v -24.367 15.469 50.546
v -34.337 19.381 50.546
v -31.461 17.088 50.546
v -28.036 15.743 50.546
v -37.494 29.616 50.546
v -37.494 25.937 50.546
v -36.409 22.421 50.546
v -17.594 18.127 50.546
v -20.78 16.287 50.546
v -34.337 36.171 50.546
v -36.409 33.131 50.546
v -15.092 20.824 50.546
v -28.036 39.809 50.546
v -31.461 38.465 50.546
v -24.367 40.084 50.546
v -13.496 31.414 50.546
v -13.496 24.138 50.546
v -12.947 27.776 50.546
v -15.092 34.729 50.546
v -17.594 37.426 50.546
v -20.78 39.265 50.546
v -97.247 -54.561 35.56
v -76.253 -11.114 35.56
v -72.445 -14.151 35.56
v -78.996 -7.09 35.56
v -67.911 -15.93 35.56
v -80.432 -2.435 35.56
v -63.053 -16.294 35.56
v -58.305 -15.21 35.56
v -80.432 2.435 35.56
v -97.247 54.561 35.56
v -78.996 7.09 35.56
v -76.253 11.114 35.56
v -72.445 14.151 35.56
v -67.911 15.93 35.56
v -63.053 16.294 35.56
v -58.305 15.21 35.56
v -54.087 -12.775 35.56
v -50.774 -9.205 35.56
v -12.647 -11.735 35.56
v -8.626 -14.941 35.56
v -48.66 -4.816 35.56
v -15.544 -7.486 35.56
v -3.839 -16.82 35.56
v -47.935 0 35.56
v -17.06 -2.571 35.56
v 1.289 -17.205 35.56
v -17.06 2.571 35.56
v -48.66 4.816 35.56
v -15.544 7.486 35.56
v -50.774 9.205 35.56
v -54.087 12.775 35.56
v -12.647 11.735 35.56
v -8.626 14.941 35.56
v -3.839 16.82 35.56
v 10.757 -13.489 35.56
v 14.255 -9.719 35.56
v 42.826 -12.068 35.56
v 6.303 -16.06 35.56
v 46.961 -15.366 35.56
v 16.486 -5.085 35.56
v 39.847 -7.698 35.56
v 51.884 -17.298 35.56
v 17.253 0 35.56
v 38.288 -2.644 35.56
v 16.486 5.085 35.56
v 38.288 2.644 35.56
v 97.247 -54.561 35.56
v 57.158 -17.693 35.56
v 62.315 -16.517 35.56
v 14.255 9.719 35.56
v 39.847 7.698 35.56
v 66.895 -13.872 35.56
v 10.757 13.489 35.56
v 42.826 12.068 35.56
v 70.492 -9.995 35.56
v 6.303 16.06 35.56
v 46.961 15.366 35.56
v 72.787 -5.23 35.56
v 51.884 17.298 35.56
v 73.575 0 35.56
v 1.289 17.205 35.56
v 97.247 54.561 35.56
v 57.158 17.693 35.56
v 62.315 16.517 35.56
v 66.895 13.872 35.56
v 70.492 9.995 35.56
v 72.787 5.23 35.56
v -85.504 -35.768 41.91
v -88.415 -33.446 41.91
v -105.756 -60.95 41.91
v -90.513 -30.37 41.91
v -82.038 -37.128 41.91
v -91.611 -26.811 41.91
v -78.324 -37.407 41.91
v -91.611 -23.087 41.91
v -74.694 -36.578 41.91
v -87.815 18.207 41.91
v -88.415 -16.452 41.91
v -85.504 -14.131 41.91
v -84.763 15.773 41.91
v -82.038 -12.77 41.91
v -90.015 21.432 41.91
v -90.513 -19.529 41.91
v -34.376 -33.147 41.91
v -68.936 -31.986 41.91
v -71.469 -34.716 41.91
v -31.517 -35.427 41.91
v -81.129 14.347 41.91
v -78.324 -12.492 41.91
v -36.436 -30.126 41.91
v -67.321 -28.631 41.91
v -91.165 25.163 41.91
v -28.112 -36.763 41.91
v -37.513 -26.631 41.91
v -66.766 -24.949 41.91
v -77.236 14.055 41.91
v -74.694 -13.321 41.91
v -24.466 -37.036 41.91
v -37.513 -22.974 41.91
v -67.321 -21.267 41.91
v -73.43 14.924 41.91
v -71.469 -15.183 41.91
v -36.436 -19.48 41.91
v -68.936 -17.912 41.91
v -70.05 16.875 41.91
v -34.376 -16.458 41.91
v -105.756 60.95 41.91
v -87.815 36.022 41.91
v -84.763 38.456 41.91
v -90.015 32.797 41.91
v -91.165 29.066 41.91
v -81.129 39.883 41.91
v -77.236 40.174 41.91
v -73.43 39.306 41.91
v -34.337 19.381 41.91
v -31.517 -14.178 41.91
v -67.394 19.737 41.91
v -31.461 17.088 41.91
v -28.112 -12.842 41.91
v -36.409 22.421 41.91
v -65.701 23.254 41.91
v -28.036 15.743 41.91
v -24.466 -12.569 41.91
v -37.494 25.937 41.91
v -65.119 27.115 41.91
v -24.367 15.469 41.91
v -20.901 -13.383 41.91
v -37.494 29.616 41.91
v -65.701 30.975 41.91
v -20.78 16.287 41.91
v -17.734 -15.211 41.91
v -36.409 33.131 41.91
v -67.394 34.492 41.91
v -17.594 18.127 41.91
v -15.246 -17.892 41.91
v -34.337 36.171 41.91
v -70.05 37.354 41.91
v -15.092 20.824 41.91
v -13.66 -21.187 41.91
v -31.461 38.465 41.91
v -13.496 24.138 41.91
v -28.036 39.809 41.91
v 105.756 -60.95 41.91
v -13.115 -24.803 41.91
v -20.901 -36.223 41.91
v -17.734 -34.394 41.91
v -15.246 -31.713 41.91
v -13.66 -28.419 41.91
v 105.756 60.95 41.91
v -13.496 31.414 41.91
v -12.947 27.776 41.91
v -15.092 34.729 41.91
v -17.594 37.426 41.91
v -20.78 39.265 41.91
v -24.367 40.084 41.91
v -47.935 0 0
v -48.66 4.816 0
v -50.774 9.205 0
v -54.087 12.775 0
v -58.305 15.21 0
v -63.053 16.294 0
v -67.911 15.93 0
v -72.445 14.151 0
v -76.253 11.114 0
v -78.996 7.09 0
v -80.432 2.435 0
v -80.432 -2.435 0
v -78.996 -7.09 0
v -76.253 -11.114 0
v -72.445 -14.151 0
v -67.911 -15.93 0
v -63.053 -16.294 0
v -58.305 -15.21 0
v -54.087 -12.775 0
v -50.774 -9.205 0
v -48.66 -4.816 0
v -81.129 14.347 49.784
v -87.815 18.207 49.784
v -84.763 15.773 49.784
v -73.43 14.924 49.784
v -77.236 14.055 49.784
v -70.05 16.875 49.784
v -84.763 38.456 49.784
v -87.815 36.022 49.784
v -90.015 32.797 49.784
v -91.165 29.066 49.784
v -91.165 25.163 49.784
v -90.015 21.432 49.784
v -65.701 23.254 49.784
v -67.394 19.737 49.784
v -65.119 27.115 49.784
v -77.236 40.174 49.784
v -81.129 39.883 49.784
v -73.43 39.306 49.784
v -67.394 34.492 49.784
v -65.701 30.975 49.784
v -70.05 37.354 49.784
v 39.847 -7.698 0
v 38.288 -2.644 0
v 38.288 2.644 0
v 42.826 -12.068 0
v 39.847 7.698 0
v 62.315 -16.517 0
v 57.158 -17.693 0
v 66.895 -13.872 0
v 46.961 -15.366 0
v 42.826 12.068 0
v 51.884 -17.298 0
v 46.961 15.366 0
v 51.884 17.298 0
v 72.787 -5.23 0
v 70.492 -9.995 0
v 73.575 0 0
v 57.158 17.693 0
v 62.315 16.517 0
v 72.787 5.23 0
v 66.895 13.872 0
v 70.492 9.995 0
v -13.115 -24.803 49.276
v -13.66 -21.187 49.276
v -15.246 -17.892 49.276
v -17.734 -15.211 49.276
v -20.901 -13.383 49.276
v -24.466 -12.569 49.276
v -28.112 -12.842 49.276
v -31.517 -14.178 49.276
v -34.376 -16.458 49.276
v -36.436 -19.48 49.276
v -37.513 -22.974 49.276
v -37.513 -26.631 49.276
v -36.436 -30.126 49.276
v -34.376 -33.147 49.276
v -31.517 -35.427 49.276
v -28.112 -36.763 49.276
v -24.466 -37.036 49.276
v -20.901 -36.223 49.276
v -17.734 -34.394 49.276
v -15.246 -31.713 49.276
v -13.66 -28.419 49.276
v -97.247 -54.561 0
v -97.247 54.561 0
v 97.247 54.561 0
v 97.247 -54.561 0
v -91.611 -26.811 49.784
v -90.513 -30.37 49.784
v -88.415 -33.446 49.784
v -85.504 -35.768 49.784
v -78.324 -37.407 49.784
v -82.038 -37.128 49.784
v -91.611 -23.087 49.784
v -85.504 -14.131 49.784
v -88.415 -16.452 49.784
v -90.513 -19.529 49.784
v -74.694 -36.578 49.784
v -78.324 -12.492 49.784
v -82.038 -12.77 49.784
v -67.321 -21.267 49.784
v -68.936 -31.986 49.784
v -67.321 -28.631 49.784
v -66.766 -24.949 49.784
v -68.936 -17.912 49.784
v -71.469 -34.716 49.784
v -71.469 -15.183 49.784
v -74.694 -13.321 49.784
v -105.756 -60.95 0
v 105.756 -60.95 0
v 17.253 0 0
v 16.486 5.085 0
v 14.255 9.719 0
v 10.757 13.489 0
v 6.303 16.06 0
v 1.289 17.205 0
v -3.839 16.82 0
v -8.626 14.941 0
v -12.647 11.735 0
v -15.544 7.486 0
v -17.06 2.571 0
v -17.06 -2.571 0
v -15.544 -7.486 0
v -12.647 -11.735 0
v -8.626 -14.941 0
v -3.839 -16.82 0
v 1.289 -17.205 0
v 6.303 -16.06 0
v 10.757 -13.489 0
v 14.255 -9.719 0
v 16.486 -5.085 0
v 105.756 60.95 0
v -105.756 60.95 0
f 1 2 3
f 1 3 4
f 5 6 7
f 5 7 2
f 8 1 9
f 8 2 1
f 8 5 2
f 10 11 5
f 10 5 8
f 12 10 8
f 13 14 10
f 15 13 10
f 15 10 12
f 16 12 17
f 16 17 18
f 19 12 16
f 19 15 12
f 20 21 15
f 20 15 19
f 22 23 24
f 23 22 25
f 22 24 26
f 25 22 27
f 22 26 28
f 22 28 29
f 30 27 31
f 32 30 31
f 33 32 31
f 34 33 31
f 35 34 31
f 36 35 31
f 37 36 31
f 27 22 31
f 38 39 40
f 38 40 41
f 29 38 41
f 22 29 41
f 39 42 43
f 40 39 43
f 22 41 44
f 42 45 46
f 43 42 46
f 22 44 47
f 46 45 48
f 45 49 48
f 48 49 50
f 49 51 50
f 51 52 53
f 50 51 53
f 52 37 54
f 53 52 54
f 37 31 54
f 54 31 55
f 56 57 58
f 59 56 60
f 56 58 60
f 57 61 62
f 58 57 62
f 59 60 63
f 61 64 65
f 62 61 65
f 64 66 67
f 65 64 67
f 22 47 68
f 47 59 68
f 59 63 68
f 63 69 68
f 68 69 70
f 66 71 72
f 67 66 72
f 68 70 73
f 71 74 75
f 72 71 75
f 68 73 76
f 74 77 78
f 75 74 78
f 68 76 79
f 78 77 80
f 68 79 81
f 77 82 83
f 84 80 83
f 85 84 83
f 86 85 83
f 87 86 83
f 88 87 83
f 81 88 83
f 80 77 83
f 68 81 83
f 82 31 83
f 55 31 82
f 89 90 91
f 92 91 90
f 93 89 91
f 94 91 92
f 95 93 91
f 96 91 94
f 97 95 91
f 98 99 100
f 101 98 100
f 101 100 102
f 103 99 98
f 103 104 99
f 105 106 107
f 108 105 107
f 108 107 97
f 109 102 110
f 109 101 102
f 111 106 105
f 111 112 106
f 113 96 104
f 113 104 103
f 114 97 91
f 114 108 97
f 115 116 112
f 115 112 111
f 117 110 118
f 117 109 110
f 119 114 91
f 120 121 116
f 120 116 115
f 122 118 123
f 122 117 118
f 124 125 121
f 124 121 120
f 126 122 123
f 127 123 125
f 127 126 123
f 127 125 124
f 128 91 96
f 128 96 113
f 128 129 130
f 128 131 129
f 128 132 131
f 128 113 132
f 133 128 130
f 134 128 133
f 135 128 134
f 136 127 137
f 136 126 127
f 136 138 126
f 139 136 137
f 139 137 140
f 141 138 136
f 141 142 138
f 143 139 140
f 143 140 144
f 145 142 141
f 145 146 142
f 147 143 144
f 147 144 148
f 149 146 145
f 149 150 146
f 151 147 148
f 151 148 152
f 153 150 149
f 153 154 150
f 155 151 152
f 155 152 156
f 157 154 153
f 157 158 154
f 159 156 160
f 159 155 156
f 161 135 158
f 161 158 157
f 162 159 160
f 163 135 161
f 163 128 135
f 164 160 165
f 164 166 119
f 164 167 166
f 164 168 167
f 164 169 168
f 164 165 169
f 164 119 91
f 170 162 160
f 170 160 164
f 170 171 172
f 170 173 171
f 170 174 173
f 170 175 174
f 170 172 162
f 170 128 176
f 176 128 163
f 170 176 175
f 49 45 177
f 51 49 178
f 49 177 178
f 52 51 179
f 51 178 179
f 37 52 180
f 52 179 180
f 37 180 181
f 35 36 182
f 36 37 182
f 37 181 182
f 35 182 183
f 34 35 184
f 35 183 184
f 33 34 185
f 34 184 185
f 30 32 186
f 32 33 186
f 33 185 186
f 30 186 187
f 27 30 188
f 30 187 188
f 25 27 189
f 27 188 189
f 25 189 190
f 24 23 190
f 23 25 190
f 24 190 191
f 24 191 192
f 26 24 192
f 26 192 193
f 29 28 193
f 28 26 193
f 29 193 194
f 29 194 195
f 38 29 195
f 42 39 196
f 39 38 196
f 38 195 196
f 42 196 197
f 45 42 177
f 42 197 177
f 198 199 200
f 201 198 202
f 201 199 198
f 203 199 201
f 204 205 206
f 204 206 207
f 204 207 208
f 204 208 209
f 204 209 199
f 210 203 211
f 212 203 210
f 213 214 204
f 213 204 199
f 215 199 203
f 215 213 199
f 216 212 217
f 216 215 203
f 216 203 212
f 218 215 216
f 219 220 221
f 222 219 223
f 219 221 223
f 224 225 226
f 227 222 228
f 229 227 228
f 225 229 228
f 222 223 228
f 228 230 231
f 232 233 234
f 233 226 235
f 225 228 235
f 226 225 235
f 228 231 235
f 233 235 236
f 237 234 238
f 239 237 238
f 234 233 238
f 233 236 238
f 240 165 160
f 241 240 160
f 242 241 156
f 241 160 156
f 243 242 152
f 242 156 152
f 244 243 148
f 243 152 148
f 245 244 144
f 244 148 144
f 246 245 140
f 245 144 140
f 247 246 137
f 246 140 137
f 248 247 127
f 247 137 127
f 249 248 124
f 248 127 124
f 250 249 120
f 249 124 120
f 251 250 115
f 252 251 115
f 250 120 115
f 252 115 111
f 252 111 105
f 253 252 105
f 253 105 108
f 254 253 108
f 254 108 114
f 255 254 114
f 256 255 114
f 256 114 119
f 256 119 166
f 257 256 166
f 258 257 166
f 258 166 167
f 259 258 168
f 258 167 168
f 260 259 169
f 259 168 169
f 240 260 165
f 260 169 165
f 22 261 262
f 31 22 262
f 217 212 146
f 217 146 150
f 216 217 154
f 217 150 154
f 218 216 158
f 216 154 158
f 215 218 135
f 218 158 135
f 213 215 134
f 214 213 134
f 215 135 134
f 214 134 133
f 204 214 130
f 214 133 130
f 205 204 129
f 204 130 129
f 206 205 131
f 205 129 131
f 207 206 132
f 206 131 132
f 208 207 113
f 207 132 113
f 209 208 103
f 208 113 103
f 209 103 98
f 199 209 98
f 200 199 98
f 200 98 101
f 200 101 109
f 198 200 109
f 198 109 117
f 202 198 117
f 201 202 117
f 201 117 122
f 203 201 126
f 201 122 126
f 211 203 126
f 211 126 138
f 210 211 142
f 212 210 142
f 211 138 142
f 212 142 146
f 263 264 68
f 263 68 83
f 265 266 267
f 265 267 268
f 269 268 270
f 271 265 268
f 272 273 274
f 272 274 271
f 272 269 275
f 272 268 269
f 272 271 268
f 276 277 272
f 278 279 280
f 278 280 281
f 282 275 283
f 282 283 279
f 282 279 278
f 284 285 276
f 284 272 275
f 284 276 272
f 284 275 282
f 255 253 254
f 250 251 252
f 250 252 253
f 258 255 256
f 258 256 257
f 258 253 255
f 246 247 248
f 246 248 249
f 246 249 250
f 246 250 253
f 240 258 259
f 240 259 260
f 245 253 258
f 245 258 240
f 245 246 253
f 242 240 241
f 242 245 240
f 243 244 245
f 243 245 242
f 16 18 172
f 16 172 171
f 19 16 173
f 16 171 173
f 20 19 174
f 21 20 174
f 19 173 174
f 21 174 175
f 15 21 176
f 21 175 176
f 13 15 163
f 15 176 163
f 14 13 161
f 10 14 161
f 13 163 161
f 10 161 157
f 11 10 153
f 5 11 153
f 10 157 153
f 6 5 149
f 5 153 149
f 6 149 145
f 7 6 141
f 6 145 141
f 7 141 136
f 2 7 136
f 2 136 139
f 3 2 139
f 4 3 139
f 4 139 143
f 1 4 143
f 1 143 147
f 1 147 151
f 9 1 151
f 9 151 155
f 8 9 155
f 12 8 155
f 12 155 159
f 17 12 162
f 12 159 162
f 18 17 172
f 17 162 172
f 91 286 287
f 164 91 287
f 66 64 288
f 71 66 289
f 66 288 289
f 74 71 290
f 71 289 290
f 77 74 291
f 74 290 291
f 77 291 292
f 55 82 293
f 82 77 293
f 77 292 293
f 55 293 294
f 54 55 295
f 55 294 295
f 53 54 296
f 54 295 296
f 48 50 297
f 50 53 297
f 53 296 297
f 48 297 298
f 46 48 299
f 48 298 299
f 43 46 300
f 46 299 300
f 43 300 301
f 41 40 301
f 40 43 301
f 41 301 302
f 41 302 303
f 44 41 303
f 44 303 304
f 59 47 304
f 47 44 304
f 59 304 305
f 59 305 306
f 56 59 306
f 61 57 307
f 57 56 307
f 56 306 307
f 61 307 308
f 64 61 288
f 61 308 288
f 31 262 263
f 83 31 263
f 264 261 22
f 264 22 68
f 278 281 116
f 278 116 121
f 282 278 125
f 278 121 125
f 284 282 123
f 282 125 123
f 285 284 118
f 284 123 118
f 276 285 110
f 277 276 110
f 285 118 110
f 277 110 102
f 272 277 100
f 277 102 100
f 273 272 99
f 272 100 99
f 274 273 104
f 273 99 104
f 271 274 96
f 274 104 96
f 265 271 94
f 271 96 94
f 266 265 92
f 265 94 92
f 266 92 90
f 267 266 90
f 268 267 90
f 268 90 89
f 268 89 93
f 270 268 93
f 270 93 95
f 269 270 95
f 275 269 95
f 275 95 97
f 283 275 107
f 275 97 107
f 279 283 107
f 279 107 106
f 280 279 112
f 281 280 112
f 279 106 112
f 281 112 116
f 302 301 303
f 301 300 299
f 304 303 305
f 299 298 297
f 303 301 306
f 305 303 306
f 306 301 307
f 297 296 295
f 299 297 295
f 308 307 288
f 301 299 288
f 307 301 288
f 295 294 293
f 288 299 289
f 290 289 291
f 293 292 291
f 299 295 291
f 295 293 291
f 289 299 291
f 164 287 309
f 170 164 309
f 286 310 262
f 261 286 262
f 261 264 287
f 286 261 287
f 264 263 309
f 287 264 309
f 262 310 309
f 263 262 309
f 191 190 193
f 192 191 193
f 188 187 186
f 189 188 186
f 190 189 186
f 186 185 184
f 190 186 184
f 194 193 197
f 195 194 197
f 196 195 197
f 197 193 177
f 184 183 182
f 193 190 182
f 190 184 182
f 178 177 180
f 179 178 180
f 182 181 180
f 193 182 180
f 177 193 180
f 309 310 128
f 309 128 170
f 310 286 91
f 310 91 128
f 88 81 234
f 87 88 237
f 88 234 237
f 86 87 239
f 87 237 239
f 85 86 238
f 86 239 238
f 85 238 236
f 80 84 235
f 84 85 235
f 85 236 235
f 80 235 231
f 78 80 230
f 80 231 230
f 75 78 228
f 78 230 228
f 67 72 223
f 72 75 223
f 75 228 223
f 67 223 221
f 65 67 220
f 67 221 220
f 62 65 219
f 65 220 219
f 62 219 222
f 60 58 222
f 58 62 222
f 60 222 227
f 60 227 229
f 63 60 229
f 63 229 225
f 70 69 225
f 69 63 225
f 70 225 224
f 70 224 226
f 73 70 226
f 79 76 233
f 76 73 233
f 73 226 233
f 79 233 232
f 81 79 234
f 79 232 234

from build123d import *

# Parameters (mm, degrees)
F0_W      = 211.511924
F0_H      = 121.89918
F1_DEPTH  = 41.91
F2_R      = 13.096374
F3_DEPTH  = 7.874
F4_R      = 12.492231
F5_DEPTH  = 7.874
F6_R      = 12.342141
F7_DEPTH  = 8.636
F8_R      = 12.267879
F9_DEPTH  = 7.366
F10_W     = 194.494978
F10_H     = 109.122164
F11_DEPTH = 35.56
F12_R     = 17.252828
F13_DEPTH = 40.852703
F14_R     = 16.340018
F15_DEPTH = 40.93973
F16_R     = 17.743015
F17_DEPTH = 41.344658


with BuildPart() as f1:
    # F0 (on Top) → F1 (new body)
    with BuildSketch(Plane.XY):
        Rectangle(F0_W, F0_H)
    extrude(amount=F1_DEPTH)

    # F2 (on face) → F3 (join)
    with BuildSketch(Plane.XY.offset(41.91)):
        with Locations((-78.215137, 27.114578)):
            Circle(F2_R)
    extrude(amount=F3_DEPTH)

    # F4 (on face) → F5 (join)
    with BuildSketch(Plane.XY.offset(41.91)):
        with Locations((-79.258002, -24.949349)):
            Circle(F4_R)
    extrude(amount=F5_DEPTH)

    # F6 (on face) → F7 (join)
    with BuildSketch(Plane.XY.offset(41.91)):
        with Locations((-25.289563, 27.77613)):
            Circle(F6_R)
    extrude(amount=F7_DEPTH)

    # F8 (on face) → F9 (join)
    with BuildSketch(Plane.XY.offset(41.91)):
        with Locations((-25.382636, -24.802757)):
            Circle(F8_R)
    extrude(amount=F9_DEPTH)

    # F10 (on face) → F11 (cut)
    with BuildSketch(Plane.XY):
        Rectangle(F10_W, F10_H)
    extrude(amount=F11_DEPTH, mode=Mode.SUBTRACT)

    # F12 (on face) → F13 (join)
    with BuildSketch(Plane.XY):
        Circle(F12_R)
    extrude(amount=F13_DEPTH)

    # F14 (on face) → F15 (join)
    with BuildSketch(Plane.XY):
        with Locations((-64.27452, 0)):
            Circle(F14_R)
    extrude(amount=F15_DEPTH)

    # F16 (on face) → F17 (join)
    with BuildSketch(Plane.XY):
        with Locations((55.832461, 0)):
            Circle(F16_R)
    extrude(amount=F17_DEPTH)


solid = f1.part
